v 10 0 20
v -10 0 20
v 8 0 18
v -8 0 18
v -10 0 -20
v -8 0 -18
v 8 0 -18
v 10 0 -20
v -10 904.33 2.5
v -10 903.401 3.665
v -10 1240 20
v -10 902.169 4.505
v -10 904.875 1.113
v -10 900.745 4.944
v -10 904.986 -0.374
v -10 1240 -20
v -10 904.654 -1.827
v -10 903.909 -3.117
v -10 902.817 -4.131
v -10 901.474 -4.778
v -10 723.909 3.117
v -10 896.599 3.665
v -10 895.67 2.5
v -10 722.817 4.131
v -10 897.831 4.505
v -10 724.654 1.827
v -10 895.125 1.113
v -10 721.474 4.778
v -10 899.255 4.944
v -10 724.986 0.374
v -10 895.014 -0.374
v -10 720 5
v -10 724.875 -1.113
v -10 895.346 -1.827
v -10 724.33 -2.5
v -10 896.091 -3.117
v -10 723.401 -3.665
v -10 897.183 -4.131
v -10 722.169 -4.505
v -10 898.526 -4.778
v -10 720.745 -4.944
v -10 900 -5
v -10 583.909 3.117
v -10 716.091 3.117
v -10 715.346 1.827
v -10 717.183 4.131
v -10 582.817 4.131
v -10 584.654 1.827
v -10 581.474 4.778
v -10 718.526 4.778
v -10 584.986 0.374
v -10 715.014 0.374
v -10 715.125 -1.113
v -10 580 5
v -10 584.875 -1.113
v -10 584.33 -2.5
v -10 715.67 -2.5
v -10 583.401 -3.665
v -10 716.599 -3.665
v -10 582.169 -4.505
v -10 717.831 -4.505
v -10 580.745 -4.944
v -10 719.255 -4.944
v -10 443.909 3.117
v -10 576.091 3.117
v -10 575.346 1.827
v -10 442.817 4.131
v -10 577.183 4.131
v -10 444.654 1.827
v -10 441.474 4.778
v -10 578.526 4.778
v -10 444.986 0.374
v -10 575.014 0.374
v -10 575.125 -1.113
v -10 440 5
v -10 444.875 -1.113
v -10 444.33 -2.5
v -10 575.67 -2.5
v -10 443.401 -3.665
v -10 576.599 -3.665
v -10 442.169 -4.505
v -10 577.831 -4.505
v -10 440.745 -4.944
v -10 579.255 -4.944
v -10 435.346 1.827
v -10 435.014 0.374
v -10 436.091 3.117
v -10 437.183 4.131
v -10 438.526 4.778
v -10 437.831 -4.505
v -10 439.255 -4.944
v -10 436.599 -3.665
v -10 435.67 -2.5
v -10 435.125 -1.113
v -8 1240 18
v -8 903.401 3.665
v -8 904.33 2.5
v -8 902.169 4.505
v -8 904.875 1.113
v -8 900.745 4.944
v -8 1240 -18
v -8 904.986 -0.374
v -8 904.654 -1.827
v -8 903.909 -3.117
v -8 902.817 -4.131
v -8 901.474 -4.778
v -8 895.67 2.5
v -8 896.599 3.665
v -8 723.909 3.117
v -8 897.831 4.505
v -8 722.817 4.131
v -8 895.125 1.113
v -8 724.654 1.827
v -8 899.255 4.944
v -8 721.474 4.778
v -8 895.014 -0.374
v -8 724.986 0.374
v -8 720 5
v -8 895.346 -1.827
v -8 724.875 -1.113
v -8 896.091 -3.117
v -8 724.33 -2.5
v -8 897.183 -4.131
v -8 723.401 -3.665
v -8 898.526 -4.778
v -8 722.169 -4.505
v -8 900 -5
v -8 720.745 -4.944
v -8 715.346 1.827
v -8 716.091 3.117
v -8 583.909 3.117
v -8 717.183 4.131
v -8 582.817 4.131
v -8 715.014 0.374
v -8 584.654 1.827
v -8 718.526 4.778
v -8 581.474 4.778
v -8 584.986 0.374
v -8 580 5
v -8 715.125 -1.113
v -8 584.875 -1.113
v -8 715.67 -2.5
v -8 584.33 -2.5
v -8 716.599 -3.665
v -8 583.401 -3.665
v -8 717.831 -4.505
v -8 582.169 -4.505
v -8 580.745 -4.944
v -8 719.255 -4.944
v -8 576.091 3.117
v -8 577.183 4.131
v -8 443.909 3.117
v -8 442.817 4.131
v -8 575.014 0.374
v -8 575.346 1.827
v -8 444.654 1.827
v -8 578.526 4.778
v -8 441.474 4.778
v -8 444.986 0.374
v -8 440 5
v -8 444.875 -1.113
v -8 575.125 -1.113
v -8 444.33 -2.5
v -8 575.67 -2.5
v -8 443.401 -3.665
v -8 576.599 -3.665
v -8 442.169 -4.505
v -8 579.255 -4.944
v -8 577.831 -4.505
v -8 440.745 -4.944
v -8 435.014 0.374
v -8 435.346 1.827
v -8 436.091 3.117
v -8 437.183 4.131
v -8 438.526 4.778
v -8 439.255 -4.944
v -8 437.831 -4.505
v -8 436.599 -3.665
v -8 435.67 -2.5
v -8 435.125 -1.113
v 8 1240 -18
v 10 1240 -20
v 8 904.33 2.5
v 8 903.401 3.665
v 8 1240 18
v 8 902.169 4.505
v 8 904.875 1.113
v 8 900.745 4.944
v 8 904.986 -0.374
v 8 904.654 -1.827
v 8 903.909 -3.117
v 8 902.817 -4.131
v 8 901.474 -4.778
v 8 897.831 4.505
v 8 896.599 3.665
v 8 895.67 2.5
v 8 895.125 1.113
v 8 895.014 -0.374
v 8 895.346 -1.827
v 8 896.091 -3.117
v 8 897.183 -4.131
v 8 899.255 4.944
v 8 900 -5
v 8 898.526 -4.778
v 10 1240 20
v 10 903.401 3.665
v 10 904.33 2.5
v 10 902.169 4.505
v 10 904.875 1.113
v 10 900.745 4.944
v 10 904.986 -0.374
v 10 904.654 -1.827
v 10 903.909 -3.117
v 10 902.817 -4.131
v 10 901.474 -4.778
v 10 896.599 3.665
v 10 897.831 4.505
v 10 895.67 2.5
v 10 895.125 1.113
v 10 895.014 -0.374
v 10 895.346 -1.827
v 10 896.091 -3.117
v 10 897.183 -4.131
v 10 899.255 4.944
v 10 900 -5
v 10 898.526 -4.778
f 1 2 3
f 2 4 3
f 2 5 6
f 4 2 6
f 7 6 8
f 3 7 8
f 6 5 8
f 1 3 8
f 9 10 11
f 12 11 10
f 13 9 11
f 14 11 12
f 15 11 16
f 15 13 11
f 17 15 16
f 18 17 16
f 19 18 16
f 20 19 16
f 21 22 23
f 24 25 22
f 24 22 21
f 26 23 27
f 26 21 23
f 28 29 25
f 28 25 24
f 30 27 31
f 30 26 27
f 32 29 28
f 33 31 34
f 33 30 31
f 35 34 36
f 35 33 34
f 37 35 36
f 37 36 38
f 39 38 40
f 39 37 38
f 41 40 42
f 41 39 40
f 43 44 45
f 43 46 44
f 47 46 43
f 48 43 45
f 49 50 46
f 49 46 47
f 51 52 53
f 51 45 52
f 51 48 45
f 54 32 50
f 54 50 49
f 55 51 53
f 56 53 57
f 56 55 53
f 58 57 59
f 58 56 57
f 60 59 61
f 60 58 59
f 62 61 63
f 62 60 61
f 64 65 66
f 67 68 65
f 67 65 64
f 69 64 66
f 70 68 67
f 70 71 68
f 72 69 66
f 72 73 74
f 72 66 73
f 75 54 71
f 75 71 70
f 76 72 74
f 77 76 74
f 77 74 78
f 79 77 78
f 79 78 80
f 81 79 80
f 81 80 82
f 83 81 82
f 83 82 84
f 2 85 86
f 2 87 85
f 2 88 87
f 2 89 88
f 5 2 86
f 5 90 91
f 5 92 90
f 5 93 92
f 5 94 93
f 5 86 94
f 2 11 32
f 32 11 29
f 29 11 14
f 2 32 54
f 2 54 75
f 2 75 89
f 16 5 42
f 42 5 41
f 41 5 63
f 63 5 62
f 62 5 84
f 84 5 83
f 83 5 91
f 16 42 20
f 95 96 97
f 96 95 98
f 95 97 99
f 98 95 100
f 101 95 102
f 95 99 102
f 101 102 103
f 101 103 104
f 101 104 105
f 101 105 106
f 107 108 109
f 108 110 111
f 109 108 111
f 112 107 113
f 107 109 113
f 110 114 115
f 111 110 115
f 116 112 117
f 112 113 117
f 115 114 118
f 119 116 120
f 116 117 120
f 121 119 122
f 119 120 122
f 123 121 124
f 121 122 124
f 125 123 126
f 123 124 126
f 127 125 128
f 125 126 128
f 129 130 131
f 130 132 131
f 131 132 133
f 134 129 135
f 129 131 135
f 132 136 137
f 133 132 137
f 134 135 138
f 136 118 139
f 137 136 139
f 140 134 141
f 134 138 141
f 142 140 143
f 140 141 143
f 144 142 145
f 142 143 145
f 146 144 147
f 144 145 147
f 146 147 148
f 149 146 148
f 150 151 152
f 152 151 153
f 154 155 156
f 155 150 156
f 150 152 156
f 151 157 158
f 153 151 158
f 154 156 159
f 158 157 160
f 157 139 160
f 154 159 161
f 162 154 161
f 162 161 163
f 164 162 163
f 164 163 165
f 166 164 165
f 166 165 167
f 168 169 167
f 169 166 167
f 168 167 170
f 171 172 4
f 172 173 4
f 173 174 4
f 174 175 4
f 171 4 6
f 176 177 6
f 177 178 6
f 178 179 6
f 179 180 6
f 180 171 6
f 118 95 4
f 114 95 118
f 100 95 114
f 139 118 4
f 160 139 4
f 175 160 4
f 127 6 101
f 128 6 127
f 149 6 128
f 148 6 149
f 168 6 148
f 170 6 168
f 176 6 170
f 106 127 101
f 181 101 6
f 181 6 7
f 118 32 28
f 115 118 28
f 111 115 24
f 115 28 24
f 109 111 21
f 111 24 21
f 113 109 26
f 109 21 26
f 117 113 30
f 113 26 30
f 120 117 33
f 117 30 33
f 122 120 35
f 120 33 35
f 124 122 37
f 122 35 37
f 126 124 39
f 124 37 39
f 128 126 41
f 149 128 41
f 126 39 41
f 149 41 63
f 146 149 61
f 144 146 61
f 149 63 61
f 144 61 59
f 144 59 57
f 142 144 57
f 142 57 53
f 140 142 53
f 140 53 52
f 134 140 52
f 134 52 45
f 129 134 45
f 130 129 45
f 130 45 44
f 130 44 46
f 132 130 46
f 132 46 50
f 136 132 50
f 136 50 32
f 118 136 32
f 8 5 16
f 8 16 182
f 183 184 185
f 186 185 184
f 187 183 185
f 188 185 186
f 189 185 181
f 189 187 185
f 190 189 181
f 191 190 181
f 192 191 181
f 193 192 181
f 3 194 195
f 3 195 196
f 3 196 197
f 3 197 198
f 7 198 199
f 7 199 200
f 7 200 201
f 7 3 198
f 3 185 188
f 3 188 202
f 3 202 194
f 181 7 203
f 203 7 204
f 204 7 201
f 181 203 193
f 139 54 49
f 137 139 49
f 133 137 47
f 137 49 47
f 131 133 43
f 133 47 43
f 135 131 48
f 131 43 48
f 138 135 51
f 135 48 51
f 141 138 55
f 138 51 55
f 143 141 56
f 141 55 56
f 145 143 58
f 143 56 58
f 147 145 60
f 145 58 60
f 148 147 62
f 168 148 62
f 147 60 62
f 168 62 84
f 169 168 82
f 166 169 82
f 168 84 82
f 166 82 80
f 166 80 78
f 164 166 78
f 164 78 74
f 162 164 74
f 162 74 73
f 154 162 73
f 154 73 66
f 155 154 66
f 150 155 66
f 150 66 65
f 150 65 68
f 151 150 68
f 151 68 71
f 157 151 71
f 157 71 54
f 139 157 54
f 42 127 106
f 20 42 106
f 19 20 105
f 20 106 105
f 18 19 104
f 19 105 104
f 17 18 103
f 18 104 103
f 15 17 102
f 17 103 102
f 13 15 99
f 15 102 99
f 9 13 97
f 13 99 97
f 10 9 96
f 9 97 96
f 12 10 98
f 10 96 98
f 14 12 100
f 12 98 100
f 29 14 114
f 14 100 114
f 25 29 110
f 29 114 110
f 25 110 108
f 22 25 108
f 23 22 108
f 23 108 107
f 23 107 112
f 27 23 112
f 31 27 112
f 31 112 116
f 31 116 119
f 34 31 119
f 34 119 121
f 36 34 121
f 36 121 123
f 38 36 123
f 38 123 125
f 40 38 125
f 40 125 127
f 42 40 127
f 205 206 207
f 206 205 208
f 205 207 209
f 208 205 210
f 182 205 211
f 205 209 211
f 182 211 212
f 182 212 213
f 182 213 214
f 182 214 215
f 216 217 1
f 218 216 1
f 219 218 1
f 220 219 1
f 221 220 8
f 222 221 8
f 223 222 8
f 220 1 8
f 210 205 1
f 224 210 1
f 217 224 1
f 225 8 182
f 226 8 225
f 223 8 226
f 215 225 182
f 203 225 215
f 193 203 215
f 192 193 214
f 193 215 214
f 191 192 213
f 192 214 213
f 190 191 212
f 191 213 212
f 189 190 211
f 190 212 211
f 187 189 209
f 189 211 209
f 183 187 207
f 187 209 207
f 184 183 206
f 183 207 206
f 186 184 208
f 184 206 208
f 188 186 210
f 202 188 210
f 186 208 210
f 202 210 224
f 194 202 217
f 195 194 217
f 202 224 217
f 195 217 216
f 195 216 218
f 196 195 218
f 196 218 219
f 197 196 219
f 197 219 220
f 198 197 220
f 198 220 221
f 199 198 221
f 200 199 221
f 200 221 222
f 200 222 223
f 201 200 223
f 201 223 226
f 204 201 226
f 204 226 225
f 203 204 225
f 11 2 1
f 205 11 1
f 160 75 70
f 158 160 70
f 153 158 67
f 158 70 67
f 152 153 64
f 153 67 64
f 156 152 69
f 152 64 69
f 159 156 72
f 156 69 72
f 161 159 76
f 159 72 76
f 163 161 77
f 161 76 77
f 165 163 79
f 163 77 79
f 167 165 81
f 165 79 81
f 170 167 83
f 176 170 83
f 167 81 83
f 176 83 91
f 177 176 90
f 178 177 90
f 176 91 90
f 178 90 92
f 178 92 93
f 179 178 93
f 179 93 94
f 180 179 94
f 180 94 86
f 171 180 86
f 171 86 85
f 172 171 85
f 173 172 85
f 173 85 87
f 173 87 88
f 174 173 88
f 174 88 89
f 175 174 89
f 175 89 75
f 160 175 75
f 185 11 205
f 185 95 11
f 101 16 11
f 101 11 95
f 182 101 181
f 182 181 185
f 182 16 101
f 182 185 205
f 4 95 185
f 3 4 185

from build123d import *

# Parameters (mm, degrees)
SKETCH_1_W          = 20
SKETCH_1_H          = 40
SKETCH_1_W_2        = 16
SKETCH_1_H_2        = 36
EXTRUDE_1_DEPTH     = 1240
SKETCH_2_R          = 5
CUT_EXTRUDE_1_DEPTH = 21
SKETCH_3_R          = 5
CUT_EXTRUDE_2_DEPTH = 10


with BuildPart() as part:
    # Эскиз1 → Вытянуть-Тонкостенный1 (new body)
    with BuildSketch(Plane(origin=(0, 0, 0), x_dir=(1, 0, 0), z_dir=(0, 1, 0))):
        Rectangle(SKETCH_1_W, SKETCH_1_H)
        Rectangle(SKETCH_1_W_2, SKETCH_1_H_2, mode=Mode.SUBTRACT)
    extrude(amount=EXTRUDE_1_DEPTH)

    # Эскиз2 → Вырез-Вытянуть1 (cut, through all)
    with BuildSketch(Plane(origin=(10, 0, 0), x_dir=(0, 0, -1), z_dir=(1, 0, 0))):
        with Locations((0, 900)):
            Circle(SKETCH_2_R)
    extrude(amount=-CUT_EXTRUDE_1_DEPTH, mode=Mode.SUBTRACT)

    # Эскиз3 → Вырез-Вытянуть2 (cut)
    with BuildSketch(Plane.ZY.offset(10)):
        with Locations((0, 720)):
            Circle(SKETCH_3_R)
        with Locations((0, 580)):
            Circle(SKETCH_3_R)
        with Locations((0, 440)):
            Circle(SKETCH_3_R)
    extrude(amount=-CUT_EXTRUDE_2_DEPTH, mode=Mode.SUBTRACT)


solid = part.part
